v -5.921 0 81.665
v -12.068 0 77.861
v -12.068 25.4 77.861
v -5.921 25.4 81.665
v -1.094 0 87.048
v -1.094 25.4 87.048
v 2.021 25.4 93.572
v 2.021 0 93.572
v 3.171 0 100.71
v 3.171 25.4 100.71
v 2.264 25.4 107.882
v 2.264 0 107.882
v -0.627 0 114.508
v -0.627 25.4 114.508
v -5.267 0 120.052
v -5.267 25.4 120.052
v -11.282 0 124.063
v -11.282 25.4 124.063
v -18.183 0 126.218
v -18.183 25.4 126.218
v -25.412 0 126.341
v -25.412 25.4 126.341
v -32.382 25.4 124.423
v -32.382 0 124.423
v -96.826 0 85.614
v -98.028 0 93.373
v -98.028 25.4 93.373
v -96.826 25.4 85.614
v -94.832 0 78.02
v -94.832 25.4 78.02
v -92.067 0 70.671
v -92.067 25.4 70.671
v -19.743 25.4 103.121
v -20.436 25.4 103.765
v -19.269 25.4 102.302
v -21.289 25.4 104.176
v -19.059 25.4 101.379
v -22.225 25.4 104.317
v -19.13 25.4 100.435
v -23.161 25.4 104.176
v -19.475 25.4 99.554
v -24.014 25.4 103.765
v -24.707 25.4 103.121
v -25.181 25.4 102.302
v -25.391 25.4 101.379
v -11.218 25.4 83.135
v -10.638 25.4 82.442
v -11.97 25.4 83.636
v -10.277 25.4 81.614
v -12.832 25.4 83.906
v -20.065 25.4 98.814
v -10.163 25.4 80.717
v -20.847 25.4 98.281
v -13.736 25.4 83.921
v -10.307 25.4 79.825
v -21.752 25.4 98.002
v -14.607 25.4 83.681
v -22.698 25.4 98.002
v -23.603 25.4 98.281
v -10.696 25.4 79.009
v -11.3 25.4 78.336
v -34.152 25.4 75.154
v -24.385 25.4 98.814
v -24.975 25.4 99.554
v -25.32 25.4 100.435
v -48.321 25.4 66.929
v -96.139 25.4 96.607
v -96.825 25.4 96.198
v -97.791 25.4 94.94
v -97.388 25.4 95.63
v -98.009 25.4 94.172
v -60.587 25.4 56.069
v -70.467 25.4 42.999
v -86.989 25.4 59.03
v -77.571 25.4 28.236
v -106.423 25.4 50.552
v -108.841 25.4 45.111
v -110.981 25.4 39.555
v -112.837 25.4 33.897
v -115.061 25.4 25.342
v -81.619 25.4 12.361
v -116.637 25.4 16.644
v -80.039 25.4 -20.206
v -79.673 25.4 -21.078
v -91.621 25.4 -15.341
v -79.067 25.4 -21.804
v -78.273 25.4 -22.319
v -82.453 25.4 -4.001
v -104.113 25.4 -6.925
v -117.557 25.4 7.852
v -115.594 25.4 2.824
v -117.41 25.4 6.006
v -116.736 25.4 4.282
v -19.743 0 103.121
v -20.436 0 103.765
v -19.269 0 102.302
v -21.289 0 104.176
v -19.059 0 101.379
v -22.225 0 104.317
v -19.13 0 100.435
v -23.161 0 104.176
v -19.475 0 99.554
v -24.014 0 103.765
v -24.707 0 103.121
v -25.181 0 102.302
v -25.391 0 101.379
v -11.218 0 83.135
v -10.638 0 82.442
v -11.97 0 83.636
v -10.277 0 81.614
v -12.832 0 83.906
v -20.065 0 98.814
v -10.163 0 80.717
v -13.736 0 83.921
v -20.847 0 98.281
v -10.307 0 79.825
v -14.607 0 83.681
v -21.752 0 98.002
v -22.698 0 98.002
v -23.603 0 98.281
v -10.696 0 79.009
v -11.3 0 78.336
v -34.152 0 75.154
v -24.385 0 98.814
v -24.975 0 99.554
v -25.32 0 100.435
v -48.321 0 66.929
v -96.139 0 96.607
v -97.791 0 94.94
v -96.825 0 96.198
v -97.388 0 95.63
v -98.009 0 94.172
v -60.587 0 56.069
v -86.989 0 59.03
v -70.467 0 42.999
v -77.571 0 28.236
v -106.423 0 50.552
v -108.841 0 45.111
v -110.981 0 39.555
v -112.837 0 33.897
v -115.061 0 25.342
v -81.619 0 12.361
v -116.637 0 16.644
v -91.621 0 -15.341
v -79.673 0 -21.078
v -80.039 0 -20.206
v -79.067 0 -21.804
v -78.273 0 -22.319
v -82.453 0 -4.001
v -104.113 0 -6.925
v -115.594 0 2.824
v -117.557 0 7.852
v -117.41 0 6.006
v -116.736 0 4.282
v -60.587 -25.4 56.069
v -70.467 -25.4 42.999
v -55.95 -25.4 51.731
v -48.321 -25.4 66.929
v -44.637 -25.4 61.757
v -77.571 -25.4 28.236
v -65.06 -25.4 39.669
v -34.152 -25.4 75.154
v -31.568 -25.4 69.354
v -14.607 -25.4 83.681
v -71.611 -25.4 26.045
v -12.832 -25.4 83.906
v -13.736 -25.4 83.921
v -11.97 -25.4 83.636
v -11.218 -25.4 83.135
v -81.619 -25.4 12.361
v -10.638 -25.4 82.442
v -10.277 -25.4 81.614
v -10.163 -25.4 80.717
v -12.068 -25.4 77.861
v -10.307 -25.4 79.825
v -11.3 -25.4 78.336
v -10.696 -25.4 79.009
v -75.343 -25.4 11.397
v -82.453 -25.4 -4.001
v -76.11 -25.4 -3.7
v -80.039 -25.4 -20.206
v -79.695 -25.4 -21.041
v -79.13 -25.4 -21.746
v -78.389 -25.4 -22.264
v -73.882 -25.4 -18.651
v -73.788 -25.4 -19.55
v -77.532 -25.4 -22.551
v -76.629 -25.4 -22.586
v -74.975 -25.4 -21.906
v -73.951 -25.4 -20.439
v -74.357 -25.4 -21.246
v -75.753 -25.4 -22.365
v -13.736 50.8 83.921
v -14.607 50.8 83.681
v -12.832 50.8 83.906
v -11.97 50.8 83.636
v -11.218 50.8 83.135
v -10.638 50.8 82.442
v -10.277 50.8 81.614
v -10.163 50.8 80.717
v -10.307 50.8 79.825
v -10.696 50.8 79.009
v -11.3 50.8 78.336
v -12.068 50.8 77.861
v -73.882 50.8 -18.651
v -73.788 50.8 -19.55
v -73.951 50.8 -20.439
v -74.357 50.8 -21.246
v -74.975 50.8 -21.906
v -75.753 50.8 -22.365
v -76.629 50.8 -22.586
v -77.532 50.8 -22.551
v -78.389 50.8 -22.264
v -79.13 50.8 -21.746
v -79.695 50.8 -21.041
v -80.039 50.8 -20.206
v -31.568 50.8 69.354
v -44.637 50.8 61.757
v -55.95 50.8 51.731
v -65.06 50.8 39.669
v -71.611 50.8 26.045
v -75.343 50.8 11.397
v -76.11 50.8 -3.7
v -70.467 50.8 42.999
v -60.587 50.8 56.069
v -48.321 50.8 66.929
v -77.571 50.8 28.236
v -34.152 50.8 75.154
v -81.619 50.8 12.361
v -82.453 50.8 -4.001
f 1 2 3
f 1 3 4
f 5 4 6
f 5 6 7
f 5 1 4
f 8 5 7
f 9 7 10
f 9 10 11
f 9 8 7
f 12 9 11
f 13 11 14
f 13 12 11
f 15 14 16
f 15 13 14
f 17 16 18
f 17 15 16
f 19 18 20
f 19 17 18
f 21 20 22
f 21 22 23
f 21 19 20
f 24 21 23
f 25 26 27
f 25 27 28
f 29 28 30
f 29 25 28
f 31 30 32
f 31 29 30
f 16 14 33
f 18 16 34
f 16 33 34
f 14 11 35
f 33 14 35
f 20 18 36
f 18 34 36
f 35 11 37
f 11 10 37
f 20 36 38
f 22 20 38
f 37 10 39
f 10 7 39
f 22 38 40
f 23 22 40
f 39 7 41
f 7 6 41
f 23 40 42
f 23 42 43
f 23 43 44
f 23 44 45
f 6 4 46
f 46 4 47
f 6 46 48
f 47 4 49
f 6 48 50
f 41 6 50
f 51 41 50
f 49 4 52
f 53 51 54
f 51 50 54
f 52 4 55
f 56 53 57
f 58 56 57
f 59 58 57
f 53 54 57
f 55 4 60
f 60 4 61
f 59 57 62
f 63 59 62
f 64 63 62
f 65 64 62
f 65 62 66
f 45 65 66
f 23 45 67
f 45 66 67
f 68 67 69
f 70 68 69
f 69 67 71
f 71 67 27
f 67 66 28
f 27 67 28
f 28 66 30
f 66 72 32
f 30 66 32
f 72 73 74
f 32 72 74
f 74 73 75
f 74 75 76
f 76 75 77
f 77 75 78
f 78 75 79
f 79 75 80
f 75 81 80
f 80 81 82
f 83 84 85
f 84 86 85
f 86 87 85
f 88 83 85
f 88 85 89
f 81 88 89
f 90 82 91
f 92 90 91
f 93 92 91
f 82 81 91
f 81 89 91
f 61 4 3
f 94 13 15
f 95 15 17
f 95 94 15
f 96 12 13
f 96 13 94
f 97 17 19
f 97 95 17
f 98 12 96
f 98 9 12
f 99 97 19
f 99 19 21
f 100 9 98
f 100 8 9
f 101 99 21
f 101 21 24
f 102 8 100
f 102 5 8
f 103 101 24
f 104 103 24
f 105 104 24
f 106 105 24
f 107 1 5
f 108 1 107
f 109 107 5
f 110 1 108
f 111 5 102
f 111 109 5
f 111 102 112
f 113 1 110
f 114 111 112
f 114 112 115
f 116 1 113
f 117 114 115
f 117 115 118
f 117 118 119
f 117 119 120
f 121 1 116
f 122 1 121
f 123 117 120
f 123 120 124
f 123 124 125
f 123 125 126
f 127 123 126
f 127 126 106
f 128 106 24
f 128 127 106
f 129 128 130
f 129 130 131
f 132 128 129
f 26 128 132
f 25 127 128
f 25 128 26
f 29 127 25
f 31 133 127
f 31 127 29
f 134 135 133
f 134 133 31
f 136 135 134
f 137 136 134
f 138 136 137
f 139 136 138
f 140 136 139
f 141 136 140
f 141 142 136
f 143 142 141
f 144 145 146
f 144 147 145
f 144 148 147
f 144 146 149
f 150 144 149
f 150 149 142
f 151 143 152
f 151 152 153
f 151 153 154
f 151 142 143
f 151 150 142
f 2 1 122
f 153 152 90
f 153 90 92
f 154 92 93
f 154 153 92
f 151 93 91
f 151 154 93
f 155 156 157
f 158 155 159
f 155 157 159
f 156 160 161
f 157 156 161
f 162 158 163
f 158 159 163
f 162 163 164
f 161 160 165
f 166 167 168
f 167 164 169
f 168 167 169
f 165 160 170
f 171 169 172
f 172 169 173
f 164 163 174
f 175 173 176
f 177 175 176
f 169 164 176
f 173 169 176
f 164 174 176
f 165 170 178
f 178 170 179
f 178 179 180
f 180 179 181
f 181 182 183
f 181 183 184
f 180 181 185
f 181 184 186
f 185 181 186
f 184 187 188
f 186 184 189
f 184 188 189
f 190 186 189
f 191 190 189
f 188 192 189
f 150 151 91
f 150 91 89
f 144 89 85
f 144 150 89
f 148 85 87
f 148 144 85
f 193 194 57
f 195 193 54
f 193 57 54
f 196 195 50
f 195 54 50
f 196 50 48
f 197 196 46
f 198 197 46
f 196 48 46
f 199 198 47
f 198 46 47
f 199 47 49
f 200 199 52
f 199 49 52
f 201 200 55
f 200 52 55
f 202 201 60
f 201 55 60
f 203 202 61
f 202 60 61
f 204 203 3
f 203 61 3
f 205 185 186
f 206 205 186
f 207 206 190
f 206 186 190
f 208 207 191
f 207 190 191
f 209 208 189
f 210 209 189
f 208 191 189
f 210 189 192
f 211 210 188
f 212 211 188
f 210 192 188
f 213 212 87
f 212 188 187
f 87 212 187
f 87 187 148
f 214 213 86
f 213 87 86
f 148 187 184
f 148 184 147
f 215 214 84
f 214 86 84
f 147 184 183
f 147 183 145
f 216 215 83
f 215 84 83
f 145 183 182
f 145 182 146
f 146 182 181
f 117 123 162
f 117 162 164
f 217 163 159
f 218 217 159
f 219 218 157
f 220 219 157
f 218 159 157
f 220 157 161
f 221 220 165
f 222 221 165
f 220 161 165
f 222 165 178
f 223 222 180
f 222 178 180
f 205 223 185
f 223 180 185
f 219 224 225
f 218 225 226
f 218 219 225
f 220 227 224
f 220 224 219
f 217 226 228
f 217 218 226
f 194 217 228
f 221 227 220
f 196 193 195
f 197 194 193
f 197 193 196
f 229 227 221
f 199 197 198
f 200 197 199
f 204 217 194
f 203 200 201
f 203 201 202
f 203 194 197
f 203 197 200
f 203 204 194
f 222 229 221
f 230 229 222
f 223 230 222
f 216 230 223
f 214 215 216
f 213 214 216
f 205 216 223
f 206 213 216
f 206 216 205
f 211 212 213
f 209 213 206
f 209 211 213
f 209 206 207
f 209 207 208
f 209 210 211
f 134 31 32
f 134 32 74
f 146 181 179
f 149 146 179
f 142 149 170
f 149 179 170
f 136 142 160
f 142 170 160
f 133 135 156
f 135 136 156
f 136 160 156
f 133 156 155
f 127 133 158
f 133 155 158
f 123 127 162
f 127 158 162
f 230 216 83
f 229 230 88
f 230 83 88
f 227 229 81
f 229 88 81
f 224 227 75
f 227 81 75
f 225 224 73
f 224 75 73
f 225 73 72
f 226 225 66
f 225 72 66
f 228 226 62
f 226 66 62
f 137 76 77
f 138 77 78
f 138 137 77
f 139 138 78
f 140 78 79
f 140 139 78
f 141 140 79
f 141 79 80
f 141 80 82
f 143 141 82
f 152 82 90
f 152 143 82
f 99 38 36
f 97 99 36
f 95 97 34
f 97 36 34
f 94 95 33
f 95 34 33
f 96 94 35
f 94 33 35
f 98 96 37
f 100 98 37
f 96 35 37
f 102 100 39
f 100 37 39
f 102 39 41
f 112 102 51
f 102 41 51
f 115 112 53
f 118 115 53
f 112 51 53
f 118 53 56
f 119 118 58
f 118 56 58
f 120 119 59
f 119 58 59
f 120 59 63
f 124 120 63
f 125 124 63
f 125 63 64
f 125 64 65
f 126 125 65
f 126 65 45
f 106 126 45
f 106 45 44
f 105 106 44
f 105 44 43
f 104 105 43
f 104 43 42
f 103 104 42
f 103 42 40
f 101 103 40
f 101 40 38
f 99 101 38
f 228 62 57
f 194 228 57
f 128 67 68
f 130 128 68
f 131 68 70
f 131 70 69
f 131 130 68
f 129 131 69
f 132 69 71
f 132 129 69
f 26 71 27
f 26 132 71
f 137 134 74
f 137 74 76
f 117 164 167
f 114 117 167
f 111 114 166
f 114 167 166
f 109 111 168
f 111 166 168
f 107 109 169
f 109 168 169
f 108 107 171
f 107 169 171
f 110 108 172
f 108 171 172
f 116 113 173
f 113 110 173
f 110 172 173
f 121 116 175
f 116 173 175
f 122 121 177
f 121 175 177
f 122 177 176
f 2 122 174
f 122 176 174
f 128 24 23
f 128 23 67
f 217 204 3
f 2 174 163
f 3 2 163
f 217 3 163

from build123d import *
from build123d.topology import SkipClean

# Parameters (mm, degrees)
BOSS_EXTRU_1_DEPTH      = 25.4
BOSS_EXTRU_3_DEPTH      = 25.4
BOSS_EXTRU_3_DEPTH_BACK = 50.8
ESQUISSE4_R             = 3.175
ENL_V_MAT_EXTRU_2_DEPTH = 181.045576616


with BuildPart() as part:
    # Esquisse1 → Boss.-Extru.1 (new body)
    with BuildSketch(Plane(origin=(0, 0, 0), x_dir=(1, 0, 0), z_dir=(0, 1, 0))):
        with BuildLine():
            Line((-86.988995356, -59.030471555), (-106.422794534, -50.551910349))
            ThreePointArc((-106.422794534, -50.551910349), (-109.945906268, -42.346245775), (-112.837401426, -33.897310746))
            ThreePointArc((-112.837401426, -33.897310746), (-115.930942089, -21.007701033), (-117.557008422, -7.852172131))
            ThreePointArc((-117.557008422, -7.852172131), (-117.13621005, -5.119362004), (-115.593885954, -2.824463565))
            ThreePointArc((-115.593885954, -2.824463565), (-97.983870719, 11.30660622), (-78.273017823, 22.319419119))
            ThreePointArc((-78.273017823, 22.319419119), (-74.924997914, 21.864997198), (-73.882142487, 18.651247184))
            ThreePointArc((-73.882142487, 18.651247184), (-68.674121781, -33.019766772), (-31.56784929, -69.353521116))
            Line((-31.56784929, -69.353521116), (-12.068063318, -77.860870983))
            ThreePointArc((-12.068063318, -77.860870983), (1.055821232, -111.298628897), (-32.381936682, -124.422513448))
            Line((-32.381936682, -124.422513448), (-96.139091412, -96.606596769))
            ThreePointArc((-96.139091412, -96.606596769), (-97.611067531, -95.297834712), (-98.027929733, -93.37278985))
            ThreePointArc((-98.027929733, -93.37278985), (-95.927030568, -81.790963802), (-92.067463697, -70.670882171))
            Line((-92.067463697, -70.670882171), (-86.988995356, -59.030471555))
        make_face()
    extrude(amount=BOSS_EXTRU_1_DEPTH)

    # Esquisse2 → Boss.-Extru.3 (add, two sides: drawn at the far end of the back side and taken through both)
    with SkipClean():  # the faces are left unmerged after this step: merging them gives an invalid solid
        with BuildSketch(Plane(origin=(0, 25.4, 0), x_dir=(1, 0, 0), z_dir=(0, 1, 0)).offset(-BOSS_EXTRU_3_DEPTH_BACK)):
            with BuildLine():
                Line((-12.068063318, -77.860870983), (-31.56784929, -69.353521116))
                ThreePointArc((-31.56784929, -69.353521116), (-68.674121781, -33.019766772), (-73.882142487, 18.651247184))
                ThreePointArc((-73.882142487, 18.651247184), (-76.183429791, 22.506805087), (-80.038987694, 20.205517783))
                ThreePointArc((-80.038987694, 20.205517783), (-74.38590155, -35.794415076), (-34.152036158, -75.1541145))
                Line((-34.152036158, -75.1541145), (-14.607297489, -83.681076291))
                ThreePointArc((-14.607297489, -83.681076291), (-10.42757775, -82.040590723), (-12.068063318, -77.860870983))
            make_face()
        extrude(amount=BOSS_EXTRU_3_DEPTH + BOSS_EXTRU_3_DEPTH_BACK)
    add(part.part.scale(1), mode=Mode.REPLACE)  # the faces are merged on a copy

    # Esquisse4 → Enlèv. mat.-Extru.2 (cut, through all)
    with BuildSketch(Plane(origin=(0, 25.4, 0), x_dir=(1, 0, 0), z_dir=(0, 1, 0))):
        with Locations((-22.225, -101.141692216)):
            Circle(ESQUISSE4_R)
    extrude(amount=-ENL_V_MAT_EXTRU_2_DEPTH, mode=Mode.SUBTRACT)


solid = part.part
